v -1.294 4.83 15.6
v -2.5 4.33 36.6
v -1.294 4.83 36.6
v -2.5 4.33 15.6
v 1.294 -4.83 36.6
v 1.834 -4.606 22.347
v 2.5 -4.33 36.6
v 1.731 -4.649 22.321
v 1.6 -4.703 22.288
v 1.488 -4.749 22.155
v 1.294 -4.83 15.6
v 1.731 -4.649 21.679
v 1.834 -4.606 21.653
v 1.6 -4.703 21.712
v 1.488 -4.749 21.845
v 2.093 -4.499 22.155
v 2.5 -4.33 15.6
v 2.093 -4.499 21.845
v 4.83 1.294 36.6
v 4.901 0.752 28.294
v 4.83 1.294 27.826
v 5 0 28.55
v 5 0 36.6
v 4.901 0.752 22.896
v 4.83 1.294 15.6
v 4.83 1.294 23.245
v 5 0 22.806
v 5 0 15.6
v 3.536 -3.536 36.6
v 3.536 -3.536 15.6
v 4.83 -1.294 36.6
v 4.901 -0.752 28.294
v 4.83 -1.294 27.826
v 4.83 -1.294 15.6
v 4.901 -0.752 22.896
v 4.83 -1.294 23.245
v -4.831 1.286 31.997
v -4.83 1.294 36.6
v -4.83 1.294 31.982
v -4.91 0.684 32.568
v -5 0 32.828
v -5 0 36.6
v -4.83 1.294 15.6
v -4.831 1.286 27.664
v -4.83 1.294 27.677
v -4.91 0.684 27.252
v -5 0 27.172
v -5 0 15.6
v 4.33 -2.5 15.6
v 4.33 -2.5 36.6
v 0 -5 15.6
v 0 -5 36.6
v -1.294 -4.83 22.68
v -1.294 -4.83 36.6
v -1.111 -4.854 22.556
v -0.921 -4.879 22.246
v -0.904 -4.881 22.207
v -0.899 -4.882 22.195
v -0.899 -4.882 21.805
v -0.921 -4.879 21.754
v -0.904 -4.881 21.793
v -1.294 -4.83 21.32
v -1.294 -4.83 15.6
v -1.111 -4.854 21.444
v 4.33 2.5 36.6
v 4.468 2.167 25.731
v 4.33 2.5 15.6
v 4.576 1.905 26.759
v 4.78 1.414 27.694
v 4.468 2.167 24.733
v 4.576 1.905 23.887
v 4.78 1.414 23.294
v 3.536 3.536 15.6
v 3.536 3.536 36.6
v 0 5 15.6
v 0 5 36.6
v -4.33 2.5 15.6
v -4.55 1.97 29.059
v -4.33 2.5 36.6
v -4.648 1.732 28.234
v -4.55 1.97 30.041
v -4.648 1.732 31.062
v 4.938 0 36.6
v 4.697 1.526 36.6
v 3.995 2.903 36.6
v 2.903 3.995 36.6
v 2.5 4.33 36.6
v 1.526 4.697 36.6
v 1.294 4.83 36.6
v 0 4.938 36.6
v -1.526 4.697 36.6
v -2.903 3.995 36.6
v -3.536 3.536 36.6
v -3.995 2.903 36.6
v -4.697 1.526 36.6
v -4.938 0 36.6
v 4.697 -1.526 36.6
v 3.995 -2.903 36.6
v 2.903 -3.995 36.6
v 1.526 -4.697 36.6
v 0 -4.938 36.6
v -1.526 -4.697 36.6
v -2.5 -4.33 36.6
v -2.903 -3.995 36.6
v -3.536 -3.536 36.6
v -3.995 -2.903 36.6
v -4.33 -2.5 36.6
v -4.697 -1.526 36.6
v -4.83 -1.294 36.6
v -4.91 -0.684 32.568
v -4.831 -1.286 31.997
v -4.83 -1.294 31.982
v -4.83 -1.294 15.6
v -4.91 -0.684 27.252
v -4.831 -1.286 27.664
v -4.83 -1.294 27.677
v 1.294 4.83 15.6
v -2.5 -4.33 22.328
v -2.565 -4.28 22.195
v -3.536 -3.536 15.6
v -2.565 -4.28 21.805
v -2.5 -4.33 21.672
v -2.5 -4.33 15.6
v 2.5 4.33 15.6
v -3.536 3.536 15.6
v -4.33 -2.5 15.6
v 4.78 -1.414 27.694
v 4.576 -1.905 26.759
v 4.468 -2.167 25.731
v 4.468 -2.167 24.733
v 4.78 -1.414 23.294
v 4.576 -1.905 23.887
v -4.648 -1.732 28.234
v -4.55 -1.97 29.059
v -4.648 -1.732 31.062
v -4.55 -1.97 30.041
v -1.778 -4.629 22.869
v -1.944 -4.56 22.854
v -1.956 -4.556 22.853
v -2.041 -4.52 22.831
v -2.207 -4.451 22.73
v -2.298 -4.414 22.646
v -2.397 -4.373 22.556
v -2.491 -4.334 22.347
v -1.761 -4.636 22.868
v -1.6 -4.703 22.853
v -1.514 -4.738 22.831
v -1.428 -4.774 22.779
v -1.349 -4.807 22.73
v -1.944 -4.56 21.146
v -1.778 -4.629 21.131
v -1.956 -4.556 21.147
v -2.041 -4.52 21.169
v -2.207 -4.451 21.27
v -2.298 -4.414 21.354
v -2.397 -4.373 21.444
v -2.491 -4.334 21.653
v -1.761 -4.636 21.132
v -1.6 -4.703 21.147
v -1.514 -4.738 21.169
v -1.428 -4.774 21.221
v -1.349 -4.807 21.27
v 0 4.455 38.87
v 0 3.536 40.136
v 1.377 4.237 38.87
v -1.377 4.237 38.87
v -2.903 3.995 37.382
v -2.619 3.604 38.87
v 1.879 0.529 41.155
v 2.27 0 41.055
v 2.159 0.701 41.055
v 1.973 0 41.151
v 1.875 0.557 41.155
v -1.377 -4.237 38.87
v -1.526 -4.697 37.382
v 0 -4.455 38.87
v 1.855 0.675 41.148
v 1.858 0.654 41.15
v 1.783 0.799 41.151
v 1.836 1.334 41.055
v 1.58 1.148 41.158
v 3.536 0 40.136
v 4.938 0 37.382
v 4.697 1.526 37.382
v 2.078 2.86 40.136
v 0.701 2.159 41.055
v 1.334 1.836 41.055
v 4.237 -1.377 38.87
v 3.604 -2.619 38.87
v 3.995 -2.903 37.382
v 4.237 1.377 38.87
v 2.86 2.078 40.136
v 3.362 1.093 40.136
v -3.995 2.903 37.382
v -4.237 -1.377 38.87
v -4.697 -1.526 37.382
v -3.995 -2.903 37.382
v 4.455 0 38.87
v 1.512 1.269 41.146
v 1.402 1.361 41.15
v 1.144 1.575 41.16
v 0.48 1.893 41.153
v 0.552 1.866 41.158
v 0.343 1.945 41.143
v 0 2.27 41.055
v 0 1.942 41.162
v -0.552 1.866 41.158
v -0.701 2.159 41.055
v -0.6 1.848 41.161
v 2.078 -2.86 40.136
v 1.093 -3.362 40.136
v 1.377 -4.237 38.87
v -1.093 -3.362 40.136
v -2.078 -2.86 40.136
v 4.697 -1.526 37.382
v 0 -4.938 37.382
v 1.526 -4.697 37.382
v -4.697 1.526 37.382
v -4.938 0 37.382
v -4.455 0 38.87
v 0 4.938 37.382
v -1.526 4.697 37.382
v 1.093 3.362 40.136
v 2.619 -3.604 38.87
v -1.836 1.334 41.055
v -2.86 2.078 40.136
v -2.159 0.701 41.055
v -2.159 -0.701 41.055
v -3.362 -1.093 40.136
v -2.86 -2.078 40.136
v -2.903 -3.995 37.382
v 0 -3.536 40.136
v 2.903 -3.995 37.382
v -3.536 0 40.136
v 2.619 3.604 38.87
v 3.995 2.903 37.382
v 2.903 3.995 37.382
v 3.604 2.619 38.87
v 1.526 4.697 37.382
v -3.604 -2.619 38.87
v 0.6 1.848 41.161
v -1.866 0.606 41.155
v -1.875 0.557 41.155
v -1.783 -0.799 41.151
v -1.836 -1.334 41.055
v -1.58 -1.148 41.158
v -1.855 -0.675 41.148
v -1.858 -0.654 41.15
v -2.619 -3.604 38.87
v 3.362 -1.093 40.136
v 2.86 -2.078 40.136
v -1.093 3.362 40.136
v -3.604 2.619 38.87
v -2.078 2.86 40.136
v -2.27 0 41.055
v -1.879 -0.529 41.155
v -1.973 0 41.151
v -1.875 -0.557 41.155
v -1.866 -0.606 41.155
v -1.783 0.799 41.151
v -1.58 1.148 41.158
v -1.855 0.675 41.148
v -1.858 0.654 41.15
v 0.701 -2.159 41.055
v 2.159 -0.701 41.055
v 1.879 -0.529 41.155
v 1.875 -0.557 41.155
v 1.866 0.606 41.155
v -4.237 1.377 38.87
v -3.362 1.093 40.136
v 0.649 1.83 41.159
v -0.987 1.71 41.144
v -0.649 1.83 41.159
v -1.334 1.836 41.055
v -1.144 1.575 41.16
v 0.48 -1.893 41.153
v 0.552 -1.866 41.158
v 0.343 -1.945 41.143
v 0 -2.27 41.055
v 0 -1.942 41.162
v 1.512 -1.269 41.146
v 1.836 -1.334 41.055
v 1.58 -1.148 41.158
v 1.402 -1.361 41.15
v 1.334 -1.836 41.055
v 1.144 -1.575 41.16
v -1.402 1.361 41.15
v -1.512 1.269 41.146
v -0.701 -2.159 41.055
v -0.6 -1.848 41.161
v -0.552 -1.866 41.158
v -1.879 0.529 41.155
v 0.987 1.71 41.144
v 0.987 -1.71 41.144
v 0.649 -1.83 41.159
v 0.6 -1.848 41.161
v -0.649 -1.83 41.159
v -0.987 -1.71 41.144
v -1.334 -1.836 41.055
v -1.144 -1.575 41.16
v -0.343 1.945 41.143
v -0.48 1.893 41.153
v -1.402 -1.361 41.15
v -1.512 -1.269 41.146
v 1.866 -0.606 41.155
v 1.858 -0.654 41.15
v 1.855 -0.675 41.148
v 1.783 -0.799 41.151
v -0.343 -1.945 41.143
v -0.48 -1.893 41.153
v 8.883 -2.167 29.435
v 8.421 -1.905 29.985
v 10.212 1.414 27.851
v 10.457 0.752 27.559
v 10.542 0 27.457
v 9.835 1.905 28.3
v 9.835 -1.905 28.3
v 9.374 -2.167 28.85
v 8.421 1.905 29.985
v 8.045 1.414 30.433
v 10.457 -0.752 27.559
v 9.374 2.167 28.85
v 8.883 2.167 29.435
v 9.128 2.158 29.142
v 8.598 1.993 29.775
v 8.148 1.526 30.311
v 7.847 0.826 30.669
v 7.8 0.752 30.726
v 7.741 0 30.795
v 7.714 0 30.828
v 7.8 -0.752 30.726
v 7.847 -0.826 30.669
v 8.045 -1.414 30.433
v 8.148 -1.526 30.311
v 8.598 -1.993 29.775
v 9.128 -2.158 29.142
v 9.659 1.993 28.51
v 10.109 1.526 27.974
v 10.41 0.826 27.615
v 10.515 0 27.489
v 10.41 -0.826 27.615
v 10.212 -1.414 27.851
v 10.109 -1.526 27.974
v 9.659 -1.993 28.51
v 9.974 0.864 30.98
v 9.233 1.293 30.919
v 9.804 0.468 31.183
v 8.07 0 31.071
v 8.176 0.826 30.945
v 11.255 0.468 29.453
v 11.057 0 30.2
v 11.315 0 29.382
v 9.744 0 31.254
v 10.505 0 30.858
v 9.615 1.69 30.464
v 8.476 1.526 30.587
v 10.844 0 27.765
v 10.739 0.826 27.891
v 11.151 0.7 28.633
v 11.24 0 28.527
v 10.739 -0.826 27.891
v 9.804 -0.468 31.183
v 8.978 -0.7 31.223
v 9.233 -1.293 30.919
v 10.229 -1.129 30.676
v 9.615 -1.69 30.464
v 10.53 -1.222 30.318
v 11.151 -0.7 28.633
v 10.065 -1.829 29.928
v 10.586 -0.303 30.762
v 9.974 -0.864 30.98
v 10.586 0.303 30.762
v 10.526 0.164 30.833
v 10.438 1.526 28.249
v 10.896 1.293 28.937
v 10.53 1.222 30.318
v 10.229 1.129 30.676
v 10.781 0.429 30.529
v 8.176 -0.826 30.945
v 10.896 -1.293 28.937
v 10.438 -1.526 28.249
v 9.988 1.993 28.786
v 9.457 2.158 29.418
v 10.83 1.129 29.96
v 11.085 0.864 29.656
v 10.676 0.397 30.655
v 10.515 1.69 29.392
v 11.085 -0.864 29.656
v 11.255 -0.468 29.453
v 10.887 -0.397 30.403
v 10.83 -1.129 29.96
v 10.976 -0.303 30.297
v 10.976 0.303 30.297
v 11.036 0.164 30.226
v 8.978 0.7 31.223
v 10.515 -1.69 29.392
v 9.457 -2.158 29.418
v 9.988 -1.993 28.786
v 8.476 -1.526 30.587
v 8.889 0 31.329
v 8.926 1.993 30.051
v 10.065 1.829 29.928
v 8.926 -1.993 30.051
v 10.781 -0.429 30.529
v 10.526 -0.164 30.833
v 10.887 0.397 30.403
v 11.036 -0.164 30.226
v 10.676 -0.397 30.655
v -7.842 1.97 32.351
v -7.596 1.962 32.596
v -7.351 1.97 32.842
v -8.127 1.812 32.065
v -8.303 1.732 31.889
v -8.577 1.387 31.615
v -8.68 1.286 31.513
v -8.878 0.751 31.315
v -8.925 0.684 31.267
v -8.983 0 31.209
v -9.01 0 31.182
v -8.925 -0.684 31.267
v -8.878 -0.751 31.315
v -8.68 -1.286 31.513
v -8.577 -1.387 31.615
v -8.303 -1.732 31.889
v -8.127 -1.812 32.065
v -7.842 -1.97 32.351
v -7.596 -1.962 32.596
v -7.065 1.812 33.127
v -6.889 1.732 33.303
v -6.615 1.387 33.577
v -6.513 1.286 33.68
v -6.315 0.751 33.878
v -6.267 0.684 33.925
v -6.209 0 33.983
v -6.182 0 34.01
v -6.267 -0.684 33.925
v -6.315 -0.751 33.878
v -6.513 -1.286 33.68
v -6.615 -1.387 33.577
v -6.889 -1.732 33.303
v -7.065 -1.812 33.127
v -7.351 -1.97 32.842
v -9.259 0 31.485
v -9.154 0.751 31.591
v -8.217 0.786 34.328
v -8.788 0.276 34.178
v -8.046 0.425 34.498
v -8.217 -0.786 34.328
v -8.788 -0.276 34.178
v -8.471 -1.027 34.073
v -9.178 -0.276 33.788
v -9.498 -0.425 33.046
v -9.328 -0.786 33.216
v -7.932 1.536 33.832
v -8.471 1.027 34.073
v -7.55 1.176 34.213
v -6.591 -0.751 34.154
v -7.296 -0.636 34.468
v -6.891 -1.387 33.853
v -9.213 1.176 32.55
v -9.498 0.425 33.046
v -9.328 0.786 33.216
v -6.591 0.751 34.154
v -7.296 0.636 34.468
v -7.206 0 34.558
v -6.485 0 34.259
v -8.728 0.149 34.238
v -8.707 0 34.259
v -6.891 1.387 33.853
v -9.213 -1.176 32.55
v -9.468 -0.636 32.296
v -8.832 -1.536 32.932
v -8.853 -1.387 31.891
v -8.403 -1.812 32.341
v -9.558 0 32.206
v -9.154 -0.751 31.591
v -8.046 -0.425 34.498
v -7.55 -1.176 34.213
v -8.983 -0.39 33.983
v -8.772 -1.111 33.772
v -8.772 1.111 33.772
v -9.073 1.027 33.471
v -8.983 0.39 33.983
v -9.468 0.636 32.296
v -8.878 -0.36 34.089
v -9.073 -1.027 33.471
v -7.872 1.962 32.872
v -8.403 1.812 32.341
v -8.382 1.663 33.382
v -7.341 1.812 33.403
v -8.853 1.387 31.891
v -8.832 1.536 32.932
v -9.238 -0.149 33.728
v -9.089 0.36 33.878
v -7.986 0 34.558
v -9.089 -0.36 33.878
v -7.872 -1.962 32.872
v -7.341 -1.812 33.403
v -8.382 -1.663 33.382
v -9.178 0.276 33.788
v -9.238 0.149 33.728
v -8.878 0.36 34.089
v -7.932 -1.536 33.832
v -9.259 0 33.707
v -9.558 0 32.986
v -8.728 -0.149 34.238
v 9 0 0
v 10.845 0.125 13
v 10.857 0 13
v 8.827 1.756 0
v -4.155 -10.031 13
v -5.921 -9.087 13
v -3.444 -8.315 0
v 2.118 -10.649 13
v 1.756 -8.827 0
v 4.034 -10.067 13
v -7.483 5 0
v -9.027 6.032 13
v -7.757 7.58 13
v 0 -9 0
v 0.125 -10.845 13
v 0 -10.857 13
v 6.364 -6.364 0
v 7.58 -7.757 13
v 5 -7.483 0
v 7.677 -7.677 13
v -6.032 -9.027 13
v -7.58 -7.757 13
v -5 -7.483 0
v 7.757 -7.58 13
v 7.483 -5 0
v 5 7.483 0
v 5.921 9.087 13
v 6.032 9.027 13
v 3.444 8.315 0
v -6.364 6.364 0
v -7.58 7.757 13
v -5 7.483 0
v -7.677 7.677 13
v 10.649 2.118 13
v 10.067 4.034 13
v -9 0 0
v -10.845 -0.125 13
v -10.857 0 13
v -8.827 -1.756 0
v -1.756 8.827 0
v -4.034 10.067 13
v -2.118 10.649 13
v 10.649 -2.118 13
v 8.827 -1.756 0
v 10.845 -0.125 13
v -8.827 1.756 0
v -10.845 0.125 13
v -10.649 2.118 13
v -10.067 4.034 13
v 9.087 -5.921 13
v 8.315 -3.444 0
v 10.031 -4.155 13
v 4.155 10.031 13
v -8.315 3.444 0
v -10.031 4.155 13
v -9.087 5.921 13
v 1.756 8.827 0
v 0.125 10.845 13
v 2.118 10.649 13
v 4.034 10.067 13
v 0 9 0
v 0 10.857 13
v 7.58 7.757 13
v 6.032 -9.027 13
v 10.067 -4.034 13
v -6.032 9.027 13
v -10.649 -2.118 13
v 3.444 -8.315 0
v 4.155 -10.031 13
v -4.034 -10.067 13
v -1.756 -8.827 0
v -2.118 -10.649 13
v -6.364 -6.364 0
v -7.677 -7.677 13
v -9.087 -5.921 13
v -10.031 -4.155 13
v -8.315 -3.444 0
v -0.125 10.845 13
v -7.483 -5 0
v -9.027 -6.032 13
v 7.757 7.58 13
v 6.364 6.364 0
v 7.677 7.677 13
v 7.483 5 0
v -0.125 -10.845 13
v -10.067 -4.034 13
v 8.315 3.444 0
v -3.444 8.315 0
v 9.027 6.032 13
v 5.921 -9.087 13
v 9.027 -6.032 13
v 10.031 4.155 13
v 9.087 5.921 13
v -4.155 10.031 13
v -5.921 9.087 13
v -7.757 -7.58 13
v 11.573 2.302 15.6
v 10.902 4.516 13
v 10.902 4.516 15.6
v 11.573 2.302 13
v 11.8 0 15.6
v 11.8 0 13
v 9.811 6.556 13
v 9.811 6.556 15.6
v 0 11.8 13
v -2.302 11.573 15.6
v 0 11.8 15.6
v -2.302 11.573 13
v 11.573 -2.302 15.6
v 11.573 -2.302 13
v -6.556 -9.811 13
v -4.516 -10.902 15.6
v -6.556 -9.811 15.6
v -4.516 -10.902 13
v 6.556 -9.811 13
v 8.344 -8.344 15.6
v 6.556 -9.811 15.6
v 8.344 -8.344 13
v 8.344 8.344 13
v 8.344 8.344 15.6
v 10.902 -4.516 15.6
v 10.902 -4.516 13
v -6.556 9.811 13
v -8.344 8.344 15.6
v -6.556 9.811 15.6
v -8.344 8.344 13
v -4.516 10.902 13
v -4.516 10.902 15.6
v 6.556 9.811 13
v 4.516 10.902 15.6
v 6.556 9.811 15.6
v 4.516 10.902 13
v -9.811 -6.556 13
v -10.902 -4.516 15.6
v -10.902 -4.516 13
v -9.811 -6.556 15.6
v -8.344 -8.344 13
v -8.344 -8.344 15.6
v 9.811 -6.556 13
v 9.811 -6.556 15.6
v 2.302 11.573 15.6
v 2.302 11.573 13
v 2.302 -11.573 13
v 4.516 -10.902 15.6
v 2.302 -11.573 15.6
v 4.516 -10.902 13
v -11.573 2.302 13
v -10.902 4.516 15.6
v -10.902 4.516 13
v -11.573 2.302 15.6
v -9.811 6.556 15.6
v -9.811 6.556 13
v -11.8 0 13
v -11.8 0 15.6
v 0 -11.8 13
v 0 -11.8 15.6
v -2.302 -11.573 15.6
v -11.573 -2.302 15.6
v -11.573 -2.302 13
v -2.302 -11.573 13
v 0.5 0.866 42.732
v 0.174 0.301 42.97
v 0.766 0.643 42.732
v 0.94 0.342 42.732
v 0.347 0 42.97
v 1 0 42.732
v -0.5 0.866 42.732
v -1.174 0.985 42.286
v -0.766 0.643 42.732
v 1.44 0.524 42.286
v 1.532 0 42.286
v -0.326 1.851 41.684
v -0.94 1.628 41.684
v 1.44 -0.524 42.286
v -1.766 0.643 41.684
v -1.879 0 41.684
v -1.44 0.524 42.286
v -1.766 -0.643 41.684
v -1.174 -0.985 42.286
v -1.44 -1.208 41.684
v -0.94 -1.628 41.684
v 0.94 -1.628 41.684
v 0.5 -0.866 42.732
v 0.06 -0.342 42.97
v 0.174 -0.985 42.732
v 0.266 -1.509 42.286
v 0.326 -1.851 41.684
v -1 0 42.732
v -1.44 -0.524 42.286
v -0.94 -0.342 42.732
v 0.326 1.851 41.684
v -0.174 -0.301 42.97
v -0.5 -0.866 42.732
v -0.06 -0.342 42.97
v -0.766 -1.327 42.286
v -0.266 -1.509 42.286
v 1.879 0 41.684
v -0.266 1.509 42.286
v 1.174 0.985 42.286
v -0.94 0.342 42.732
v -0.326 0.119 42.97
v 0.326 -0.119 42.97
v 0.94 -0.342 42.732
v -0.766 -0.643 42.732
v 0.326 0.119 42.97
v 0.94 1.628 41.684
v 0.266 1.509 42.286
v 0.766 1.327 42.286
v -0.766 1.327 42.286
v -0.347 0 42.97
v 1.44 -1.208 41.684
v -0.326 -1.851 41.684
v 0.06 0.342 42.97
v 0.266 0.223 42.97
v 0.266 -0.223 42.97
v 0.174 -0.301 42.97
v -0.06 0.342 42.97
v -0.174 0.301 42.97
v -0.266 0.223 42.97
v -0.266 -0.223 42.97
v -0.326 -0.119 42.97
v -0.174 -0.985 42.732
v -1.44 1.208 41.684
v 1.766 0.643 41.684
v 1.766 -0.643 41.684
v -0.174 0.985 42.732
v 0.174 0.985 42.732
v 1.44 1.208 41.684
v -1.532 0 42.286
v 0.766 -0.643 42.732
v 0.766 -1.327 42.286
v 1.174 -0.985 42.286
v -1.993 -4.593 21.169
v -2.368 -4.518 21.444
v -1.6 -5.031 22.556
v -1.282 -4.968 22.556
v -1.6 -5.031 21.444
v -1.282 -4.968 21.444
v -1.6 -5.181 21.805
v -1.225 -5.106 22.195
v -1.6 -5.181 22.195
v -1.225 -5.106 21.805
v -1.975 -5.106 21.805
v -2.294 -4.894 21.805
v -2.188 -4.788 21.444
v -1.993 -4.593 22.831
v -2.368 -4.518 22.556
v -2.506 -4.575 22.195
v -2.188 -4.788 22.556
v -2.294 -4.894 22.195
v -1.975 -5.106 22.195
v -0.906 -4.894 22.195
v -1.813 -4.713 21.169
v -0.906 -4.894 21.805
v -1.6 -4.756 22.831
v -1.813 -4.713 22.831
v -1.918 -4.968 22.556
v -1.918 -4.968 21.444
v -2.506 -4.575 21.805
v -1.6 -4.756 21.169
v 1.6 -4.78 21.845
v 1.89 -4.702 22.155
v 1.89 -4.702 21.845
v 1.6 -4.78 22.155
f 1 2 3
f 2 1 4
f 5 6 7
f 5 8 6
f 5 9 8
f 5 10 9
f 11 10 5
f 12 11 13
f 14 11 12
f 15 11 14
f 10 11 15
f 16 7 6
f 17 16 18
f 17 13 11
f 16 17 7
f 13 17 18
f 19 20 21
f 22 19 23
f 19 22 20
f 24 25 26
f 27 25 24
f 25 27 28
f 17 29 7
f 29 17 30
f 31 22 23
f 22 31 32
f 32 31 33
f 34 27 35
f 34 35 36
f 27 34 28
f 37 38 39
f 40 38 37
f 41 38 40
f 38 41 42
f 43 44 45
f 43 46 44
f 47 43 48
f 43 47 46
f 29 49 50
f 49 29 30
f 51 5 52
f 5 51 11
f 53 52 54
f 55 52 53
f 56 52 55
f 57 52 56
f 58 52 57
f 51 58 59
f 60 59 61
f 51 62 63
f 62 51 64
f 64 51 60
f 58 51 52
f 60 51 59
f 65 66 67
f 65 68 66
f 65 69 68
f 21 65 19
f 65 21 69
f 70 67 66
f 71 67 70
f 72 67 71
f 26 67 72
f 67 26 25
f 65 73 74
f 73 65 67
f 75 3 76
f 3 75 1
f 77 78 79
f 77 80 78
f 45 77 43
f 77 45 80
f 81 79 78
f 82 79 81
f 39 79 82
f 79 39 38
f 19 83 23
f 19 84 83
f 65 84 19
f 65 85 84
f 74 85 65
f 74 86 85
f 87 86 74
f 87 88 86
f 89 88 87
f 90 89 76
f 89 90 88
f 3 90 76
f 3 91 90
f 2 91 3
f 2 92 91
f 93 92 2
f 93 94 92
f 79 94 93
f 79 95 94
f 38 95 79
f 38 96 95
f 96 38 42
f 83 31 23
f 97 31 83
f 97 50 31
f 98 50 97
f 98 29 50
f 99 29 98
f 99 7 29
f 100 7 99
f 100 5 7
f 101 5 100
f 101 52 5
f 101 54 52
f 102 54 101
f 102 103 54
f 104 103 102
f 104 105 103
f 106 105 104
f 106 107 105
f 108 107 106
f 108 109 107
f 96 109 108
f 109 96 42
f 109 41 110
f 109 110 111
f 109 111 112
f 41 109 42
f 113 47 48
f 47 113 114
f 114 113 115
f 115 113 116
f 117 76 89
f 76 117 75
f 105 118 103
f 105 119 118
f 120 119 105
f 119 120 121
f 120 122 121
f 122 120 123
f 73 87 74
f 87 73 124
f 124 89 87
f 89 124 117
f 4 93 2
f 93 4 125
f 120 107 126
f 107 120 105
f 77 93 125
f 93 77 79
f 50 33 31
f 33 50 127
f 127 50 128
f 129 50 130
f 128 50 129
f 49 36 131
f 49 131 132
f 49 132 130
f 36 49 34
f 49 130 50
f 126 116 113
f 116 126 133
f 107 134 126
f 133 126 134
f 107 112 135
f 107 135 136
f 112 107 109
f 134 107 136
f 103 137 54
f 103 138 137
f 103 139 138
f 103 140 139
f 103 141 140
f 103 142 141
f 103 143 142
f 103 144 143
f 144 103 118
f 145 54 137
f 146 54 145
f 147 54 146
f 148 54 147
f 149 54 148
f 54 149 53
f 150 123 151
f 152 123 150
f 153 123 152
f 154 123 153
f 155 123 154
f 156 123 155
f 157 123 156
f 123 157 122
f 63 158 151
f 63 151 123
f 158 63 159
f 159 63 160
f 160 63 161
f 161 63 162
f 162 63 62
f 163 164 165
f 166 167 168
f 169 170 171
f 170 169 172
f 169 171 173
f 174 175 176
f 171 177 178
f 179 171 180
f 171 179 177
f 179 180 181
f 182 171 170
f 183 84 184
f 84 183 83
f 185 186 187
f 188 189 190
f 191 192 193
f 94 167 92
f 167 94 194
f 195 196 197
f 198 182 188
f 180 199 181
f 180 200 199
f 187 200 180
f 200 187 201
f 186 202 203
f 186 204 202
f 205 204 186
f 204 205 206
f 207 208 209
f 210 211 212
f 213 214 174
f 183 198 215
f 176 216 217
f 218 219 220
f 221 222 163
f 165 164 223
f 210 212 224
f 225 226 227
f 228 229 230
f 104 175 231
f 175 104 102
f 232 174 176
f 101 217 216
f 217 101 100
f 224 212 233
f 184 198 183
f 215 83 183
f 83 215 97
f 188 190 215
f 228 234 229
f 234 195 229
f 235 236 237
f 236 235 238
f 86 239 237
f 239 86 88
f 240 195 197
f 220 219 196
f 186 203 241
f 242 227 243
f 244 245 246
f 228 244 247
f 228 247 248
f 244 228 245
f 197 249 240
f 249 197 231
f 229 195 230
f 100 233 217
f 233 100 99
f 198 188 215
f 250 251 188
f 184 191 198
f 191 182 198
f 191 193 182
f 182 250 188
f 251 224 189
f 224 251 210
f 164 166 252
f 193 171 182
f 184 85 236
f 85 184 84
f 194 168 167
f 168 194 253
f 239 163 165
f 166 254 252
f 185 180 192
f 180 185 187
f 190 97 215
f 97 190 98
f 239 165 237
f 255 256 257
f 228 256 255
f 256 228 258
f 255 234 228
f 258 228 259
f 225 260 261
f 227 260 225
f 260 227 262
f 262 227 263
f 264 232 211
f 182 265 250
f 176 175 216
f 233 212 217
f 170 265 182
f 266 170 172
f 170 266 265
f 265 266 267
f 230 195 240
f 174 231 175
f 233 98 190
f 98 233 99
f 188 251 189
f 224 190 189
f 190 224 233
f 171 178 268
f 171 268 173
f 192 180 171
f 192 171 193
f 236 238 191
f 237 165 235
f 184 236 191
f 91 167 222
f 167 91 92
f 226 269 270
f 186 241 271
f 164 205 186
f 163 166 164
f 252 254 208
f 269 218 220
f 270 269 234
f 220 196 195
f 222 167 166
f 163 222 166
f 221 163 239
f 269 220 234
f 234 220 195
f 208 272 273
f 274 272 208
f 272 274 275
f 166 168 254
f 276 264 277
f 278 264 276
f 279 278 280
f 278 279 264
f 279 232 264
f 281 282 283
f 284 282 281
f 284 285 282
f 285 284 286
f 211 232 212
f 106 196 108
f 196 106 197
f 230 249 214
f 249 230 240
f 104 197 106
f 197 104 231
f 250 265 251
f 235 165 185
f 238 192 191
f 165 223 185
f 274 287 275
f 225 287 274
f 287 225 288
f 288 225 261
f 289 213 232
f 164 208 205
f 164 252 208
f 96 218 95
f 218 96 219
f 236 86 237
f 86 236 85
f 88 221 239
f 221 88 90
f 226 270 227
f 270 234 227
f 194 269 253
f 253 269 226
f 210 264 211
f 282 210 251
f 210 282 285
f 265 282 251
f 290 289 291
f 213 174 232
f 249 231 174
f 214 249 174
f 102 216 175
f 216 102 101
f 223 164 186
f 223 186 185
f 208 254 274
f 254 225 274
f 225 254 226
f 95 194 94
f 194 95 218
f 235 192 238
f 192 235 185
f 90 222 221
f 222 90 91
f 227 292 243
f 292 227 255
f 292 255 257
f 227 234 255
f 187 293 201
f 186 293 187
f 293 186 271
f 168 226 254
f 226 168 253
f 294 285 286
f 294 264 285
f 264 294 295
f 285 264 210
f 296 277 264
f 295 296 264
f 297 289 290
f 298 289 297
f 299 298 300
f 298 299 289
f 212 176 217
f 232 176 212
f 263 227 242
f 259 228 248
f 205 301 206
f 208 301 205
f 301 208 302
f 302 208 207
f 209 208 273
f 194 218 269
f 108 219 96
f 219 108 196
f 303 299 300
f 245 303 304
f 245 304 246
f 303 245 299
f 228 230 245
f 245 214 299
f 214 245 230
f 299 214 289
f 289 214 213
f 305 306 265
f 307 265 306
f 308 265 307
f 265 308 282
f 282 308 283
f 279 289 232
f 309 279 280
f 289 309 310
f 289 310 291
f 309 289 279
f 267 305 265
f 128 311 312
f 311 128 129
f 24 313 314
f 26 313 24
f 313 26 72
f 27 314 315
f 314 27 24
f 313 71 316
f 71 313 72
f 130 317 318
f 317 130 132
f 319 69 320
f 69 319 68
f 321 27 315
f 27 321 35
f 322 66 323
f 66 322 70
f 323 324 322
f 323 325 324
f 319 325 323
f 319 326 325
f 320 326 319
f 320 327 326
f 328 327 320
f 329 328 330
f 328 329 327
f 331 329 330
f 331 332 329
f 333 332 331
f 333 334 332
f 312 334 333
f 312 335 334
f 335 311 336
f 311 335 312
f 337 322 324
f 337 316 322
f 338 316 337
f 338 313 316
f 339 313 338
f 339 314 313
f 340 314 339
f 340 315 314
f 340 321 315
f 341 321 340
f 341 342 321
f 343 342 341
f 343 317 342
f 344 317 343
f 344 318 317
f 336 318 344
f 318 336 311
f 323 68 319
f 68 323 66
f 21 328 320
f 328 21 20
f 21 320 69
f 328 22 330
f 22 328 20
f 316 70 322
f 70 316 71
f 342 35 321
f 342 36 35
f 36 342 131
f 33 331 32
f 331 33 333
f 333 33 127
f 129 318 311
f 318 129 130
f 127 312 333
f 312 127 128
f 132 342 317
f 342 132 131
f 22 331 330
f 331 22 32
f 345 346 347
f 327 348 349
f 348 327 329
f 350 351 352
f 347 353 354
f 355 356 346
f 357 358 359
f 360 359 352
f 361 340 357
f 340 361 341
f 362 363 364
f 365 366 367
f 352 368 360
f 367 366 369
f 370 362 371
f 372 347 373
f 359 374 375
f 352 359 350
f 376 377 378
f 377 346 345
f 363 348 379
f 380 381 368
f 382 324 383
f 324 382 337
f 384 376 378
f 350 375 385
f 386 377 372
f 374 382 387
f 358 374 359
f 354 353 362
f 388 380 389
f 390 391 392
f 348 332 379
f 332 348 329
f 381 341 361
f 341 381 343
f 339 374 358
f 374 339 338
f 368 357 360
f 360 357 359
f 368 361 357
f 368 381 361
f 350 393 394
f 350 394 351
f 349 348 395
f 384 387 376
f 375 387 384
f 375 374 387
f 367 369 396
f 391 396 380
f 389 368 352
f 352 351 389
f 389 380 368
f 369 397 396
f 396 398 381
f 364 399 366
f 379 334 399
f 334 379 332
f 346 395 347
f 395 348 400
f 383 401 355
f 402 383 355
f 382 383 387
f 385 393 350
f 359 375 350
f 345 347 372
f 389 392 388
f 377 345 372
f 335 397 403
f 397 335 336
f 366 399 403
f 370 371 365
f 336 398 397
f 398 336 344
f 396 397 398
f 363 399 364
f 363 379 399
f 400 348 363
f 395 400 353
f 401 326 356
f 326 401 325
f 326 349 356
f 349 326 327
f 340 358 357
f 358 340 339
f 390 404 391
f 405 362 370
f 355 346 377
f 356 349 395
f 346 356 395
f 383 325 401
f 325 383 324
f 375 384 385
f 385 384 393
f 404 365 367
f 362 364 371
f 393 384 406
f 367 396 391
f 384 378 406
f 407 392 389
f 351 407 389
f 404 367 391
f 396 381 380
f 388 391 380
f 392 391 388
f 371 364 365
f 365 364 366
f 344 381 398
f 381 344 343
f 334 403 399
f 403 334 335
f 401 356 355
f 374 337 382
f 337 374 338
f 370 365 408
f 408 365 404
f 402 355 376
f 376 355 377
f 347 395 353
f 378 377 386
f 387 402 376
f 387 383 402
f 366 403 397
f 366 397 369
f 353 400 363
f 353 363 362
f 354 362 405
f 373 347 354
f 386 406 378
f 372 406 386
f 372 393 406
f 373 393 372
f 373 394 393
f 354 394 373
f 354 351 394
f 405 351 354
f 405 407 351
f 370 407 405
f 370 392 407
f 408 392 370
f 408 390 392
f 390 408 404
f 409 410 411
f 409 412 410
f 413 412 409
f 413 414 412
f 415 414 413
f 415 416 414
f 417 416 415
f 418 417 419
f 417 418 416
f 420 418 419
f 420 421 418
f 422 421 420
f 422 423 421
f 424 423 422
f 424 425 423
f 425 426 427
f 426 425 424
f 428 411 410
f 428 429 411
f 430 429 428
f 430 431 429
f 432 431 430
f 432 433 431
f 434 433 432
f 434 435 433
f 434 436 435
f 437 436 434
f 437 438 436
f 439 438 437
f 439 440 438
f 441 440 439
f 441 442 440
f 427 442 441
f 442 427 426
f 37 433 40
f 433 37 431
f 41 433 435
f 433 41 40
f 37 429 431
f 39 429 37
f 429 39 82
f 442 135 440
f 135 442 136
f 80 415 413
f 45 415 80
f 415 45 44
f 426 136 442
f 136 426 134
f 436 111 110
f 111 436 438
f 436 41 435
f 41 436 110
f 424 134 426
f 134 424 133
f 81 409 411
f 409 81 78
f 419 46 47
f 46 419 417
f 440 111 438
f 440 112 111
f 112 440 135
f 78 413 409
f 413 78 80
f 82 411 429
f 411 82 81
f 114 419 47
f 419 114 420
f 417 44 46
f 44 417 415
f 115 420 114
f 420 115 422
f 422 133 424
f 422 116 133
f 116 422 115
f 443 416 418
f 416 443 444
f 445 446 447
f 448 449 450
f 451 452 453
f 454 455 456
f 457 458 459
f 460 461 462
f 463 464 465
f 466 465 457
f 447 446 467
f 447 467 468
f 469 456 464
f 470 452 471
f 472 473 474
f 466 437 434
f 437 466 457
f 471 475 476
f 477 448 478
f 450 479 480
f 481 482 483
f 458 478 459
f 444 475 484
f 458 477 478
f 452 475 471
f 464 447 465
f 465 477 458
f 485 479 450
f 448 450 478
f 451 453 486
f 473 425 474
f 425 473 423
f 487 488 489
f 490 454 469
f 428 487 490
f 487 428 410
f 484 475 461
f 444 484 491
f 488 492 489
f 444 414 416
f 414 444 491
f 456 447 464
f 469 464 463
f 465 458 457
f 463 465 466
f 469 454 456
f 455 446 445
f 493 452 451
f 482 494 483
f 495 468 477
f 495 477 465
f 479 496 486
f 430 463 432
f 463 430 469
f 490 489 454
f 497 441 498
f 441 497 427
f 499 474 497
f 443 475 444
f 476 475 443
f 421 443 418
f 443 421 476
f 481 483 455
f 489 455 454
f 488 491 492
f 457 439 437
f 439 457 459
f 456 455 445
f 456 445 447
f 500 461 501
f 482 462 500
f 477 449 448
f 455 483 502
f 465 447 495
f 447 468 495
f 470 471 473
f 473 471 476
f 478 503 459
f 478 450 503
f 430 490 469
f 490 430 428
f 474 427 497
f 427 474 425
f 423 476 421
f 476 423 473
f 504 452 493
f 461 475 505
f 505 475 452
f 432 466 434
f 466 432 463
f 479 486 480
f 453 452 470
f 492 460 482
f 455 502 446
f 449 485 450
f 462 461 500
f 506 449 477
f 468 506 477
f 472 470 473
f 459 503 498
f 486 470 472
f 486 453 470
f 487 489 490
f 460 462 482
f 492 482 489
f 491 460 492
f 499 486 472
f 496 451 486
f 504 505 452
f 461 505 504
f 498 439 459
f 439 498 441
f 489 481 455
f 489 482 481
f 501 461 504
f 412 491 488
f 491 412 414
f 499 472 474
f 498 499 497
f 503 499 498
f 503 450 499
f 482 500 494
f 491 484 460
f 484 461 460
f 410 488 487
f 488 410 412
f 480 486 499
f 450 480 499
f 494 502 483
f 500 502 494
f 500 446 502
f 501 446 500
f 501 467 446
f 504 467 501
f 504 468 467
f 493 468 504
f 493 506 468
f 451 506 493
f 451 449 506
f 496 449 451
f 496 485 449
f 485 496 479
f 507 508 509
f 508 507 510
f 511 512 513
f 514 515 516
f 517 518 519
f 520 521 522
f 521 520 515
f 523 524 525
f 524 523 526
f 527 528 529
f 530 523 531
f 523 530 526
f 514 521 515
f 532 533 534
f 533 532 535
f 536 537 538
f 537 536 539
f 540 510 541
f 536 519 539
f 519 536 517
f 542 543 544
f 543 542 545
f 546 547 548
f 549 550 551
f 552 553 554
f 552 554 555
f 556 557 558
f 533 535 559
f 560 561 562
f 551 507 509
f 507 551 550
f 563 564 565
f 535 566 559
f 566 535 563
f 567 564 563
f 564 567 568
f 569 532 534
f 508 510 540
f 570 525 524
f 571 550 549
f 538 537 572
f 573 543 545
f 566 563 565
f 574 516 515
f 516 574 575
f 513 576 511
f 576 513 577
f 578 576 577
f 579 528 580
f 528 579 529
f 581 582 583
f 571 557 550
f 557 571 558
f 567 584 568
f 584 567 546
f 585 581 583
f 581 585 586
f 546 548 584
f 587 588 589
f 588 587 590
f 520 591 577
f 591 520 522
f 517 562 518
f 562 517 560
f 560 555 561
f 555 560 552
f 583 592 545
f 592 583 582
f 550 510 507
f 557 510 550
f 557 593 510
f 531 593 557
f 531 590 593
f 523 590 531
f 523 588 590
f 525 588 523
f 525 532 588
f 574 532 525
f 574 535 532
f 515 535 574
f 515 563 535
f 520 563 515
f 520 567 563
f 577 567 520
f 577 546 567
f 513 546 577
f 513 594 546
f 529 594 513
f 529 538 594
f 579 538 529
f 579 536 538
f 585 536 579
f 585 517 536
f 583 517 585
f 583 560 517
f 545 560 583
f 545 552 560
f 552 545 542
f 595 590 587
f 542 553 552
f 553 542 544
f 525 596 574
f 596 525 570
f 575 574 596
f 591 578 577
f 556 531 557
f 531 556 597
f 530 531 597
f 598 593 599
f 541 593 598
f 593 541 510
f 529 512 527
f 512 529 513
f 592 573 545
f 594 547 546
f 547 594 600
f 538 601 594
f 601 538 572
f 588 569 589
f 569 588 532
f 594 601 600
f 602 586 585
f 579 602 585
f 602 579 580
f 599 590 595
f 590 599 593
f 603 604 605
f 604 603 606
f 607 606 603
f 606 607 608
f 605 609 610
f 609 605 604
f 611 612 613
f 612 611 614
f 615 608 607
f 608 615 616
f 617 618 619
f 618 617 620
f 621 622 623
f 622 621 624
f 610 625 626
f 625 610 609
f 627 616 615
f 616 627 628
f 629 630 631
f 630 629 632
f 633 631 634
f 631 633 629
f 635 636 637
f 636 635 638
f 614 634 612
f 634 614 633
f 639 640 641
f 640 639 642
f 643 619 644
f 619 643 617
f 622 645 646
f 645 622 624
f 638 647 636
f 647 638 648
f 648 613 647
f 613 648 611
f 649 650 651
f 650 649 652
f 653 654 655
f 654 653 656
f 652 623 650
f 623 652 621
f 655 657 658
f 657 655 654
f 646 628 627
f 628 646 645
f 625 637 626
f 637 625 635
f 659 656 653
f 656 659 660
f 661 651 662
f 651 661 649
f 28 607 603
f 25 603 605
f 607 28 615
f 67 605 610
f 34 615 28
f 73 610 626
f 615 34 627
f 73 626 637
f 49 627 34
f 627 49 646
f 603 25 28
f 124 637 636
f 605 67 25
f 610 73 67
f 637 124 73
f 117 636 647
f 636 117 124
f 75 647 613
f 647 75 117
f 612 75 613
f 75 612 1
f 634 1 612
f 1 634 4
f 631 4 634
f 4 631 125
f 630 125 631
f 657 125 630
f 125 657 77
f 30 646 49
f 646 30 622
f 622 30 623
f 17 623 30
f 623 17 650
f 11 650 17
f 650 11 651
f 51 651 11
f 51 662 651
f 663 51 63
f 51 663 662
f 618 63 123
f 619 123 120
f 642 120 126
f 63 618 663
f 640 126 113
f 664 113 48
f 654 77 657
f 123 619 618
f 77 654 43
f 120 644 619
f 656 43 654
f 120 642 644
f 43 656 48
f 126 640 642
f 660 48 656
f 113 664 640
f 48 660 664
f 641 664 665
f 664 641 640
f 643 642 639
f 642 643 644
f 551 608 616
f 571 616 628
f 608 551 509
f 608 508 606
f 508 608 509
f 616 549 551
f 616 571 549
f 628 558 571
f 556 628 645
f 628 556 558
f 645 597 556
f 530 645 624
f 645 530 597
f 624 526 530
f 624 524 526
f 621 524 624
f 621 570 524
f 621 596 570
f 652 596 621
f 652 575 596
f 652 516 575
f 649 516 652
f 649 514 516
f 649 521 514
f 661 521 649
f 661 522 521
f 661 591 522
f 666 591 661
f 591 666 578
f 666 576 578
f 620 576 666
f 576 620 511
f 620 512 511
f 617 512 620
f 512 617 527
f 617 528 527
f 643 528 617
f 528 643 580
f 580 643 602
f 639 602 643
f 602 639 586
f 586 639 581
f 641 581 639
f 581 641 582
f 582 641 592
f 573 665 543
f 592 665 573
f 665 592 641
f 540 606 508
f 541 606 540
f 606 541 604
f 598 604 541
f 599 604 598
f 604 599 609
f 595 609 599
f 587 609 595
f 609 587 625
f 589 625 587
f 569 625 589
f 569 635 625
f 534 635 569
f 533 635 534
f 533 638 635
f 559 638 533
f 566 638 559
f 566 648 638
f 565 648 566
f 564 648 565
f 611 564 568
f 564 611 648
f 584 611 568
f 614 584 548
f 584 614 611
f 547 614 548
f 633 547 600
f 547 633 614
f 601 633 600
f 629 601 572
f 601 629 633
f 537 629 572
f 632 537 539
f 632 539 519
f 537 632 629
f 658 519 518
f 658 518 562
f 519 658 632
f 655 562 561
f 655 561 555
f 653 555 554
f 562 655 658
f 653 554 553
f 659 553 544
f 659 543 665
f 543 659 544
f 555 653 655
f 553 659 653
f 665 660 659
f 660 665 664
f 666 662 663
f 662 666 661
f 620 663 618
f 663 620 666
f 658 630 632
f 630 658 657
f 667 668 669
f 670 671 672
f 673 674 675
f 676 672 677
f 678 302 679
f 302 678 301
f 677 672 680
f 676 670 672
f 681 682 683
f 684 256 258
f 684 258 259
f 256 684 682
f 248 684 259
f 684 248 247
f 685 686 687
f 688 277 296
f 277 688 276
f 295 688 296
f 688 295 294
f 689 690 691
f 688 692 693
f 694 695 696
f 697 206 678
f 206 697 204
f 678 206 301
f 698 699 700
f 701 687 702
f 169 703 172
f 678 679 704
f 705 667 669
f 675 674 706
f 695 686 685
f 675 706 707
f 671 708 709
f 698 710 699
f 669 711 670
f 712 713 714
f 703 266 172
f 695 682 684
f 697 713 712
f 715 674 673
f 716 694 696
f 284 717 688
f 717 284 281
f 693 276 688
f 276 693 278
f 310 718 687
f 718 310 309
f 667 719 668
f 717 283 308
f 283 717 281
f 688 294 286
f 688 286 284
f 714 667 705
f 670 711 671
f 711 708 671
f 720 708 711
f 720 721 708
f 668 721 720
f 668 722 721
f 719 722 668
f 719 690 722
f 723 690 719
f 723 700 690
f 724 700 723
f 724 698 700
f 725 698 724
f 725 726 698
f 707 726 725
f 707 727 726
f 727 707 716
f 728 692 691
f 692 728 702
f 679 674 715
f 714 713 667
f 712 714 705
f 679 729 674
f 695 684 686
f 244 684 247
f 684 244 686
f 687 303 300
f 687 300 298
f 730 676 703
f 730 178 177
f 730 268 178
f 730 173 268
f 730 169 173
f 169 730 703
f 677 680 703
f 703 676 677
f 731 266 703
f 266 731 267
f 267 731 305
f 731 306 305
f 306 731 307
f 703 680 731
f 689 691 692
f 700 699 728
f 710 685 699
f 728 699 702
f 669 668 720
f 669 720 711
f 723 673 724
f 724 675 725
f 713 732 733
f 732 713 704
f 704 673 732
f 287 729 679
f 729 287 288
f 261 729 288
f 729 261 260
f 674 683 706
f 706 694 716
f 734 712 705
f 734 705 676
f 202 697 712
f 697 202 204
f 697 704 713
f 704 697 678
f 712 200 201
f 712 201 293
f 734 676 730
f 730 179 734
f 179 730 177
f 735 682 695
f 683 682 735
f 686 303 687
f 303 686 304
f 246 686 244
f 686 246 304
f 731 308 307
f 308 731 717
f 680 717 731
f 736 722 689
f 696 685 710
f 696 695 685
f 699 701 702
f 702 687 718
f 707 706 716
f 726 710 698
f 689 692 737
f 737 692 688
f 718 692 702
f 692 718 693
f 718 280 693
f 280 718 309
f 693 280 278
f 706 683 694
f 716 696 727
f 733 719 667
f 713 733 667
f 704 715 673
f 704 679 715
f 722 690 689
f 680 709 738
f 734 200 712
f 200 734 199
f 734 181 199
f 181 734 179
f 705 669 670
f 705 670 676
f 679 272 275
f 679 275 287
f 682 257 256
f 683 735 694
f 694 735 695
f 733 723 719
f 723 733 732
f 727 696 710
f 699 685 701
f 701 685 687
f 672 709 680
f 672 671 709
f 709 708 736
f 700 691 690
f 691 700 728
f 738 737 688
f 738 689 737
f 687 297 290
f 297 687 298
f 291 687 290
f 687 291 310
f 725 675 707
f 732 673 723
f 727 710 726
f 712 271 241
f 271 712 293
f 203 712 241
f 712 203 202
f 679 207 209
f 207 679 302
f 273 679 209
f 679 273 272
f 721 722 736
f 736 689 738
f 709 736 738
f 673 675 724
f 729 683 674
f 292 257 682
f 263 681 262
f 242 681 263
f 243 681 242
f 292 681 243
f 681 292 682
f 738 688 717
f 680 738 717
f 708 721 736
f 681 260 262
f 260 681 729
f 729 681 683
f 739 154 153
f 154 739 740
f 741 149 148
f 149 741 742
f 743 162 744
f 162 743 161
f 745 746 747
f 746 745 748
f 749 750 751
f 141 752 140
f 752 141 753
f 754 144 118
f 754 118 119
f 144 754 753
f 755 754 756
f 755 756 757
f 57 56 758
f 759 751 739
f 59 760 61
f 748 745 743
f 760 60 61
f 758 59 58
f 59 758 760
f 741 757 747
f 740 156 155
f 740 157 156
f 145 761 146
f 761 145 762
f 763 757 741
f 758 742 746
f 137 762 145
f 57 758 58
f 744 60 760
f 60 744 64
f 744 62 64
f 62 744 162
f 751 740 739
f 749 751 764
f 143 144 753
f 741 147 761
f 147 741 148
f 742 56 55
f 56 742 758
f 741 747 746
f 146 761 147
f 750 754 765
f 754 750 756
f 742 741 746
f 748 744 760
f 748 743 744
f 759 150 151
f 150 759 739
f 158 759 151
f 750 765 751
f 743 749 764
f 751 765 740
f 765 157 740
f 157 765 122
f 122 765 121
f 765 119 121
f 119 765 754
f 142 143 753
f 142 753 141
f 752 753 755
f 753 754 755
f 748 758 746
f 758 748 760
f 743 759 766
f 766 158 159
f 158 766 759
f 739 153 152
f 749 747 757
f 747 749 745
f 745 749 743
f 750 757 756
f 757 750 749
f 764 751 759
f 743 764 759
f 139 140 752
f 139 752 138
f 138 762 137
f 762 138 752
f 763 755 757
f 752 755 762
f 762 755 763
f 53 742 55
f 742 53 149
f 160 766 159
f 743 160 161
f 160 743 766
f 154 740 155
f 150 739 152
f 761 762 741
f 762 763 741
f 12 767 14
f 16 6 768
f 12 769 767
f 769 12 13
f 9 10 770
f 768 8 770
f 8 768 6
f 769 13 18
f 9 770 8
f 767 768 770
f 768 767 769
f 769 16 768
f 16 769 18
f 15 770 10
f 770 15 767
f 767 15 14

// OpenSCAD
$fn = 20;
cylinder(h = 14, r1 = 9, r2 = 11, $fn = 32); // pot
translate([0, 0, 13]) cylinder(h = 2.6, r = 11.8, $fn = 32); // rim
translate([0, 0, 14.2]) cylinder(h = 0.4, r = 10.5, $fn = 32); // soil
translate([0, 0, 12.6]) union() { // body
  cylinder(h = 24, r = 5, $fn = 24);
  translate([0, 0, 24]) sphere(r = 5, $fn = 20);
}
translate([3, 0, 24]) rotate([0, 50, 0]) union() { // arm-r
  cylinder(h = 8, r = 2.2, $fn = 18);
  translate([0, 0, 8]) sphere(r = 2.2, $fn = 16);
}
translate([-3, 0, 28]) rotate([0, -45, 0]) union() { // arm-l
  cylinder(h = 6.5, r = 2.0, $fn = 18);
  translate([0, 0, 6.5]) sphere(r = 2.0, $fn = 16);
}
translate([0, 0, 41]) sphere(r = 2.0, $fn = 18); // flower (pokes out of the dome apex)
translate([-1.6, -4.2, 22]) sphere(r = 1.0, $fn = 16); // eye L
translate([1.6, -4.2, 22]) sphere(r = 0.6, $fn = 12); // eye R
